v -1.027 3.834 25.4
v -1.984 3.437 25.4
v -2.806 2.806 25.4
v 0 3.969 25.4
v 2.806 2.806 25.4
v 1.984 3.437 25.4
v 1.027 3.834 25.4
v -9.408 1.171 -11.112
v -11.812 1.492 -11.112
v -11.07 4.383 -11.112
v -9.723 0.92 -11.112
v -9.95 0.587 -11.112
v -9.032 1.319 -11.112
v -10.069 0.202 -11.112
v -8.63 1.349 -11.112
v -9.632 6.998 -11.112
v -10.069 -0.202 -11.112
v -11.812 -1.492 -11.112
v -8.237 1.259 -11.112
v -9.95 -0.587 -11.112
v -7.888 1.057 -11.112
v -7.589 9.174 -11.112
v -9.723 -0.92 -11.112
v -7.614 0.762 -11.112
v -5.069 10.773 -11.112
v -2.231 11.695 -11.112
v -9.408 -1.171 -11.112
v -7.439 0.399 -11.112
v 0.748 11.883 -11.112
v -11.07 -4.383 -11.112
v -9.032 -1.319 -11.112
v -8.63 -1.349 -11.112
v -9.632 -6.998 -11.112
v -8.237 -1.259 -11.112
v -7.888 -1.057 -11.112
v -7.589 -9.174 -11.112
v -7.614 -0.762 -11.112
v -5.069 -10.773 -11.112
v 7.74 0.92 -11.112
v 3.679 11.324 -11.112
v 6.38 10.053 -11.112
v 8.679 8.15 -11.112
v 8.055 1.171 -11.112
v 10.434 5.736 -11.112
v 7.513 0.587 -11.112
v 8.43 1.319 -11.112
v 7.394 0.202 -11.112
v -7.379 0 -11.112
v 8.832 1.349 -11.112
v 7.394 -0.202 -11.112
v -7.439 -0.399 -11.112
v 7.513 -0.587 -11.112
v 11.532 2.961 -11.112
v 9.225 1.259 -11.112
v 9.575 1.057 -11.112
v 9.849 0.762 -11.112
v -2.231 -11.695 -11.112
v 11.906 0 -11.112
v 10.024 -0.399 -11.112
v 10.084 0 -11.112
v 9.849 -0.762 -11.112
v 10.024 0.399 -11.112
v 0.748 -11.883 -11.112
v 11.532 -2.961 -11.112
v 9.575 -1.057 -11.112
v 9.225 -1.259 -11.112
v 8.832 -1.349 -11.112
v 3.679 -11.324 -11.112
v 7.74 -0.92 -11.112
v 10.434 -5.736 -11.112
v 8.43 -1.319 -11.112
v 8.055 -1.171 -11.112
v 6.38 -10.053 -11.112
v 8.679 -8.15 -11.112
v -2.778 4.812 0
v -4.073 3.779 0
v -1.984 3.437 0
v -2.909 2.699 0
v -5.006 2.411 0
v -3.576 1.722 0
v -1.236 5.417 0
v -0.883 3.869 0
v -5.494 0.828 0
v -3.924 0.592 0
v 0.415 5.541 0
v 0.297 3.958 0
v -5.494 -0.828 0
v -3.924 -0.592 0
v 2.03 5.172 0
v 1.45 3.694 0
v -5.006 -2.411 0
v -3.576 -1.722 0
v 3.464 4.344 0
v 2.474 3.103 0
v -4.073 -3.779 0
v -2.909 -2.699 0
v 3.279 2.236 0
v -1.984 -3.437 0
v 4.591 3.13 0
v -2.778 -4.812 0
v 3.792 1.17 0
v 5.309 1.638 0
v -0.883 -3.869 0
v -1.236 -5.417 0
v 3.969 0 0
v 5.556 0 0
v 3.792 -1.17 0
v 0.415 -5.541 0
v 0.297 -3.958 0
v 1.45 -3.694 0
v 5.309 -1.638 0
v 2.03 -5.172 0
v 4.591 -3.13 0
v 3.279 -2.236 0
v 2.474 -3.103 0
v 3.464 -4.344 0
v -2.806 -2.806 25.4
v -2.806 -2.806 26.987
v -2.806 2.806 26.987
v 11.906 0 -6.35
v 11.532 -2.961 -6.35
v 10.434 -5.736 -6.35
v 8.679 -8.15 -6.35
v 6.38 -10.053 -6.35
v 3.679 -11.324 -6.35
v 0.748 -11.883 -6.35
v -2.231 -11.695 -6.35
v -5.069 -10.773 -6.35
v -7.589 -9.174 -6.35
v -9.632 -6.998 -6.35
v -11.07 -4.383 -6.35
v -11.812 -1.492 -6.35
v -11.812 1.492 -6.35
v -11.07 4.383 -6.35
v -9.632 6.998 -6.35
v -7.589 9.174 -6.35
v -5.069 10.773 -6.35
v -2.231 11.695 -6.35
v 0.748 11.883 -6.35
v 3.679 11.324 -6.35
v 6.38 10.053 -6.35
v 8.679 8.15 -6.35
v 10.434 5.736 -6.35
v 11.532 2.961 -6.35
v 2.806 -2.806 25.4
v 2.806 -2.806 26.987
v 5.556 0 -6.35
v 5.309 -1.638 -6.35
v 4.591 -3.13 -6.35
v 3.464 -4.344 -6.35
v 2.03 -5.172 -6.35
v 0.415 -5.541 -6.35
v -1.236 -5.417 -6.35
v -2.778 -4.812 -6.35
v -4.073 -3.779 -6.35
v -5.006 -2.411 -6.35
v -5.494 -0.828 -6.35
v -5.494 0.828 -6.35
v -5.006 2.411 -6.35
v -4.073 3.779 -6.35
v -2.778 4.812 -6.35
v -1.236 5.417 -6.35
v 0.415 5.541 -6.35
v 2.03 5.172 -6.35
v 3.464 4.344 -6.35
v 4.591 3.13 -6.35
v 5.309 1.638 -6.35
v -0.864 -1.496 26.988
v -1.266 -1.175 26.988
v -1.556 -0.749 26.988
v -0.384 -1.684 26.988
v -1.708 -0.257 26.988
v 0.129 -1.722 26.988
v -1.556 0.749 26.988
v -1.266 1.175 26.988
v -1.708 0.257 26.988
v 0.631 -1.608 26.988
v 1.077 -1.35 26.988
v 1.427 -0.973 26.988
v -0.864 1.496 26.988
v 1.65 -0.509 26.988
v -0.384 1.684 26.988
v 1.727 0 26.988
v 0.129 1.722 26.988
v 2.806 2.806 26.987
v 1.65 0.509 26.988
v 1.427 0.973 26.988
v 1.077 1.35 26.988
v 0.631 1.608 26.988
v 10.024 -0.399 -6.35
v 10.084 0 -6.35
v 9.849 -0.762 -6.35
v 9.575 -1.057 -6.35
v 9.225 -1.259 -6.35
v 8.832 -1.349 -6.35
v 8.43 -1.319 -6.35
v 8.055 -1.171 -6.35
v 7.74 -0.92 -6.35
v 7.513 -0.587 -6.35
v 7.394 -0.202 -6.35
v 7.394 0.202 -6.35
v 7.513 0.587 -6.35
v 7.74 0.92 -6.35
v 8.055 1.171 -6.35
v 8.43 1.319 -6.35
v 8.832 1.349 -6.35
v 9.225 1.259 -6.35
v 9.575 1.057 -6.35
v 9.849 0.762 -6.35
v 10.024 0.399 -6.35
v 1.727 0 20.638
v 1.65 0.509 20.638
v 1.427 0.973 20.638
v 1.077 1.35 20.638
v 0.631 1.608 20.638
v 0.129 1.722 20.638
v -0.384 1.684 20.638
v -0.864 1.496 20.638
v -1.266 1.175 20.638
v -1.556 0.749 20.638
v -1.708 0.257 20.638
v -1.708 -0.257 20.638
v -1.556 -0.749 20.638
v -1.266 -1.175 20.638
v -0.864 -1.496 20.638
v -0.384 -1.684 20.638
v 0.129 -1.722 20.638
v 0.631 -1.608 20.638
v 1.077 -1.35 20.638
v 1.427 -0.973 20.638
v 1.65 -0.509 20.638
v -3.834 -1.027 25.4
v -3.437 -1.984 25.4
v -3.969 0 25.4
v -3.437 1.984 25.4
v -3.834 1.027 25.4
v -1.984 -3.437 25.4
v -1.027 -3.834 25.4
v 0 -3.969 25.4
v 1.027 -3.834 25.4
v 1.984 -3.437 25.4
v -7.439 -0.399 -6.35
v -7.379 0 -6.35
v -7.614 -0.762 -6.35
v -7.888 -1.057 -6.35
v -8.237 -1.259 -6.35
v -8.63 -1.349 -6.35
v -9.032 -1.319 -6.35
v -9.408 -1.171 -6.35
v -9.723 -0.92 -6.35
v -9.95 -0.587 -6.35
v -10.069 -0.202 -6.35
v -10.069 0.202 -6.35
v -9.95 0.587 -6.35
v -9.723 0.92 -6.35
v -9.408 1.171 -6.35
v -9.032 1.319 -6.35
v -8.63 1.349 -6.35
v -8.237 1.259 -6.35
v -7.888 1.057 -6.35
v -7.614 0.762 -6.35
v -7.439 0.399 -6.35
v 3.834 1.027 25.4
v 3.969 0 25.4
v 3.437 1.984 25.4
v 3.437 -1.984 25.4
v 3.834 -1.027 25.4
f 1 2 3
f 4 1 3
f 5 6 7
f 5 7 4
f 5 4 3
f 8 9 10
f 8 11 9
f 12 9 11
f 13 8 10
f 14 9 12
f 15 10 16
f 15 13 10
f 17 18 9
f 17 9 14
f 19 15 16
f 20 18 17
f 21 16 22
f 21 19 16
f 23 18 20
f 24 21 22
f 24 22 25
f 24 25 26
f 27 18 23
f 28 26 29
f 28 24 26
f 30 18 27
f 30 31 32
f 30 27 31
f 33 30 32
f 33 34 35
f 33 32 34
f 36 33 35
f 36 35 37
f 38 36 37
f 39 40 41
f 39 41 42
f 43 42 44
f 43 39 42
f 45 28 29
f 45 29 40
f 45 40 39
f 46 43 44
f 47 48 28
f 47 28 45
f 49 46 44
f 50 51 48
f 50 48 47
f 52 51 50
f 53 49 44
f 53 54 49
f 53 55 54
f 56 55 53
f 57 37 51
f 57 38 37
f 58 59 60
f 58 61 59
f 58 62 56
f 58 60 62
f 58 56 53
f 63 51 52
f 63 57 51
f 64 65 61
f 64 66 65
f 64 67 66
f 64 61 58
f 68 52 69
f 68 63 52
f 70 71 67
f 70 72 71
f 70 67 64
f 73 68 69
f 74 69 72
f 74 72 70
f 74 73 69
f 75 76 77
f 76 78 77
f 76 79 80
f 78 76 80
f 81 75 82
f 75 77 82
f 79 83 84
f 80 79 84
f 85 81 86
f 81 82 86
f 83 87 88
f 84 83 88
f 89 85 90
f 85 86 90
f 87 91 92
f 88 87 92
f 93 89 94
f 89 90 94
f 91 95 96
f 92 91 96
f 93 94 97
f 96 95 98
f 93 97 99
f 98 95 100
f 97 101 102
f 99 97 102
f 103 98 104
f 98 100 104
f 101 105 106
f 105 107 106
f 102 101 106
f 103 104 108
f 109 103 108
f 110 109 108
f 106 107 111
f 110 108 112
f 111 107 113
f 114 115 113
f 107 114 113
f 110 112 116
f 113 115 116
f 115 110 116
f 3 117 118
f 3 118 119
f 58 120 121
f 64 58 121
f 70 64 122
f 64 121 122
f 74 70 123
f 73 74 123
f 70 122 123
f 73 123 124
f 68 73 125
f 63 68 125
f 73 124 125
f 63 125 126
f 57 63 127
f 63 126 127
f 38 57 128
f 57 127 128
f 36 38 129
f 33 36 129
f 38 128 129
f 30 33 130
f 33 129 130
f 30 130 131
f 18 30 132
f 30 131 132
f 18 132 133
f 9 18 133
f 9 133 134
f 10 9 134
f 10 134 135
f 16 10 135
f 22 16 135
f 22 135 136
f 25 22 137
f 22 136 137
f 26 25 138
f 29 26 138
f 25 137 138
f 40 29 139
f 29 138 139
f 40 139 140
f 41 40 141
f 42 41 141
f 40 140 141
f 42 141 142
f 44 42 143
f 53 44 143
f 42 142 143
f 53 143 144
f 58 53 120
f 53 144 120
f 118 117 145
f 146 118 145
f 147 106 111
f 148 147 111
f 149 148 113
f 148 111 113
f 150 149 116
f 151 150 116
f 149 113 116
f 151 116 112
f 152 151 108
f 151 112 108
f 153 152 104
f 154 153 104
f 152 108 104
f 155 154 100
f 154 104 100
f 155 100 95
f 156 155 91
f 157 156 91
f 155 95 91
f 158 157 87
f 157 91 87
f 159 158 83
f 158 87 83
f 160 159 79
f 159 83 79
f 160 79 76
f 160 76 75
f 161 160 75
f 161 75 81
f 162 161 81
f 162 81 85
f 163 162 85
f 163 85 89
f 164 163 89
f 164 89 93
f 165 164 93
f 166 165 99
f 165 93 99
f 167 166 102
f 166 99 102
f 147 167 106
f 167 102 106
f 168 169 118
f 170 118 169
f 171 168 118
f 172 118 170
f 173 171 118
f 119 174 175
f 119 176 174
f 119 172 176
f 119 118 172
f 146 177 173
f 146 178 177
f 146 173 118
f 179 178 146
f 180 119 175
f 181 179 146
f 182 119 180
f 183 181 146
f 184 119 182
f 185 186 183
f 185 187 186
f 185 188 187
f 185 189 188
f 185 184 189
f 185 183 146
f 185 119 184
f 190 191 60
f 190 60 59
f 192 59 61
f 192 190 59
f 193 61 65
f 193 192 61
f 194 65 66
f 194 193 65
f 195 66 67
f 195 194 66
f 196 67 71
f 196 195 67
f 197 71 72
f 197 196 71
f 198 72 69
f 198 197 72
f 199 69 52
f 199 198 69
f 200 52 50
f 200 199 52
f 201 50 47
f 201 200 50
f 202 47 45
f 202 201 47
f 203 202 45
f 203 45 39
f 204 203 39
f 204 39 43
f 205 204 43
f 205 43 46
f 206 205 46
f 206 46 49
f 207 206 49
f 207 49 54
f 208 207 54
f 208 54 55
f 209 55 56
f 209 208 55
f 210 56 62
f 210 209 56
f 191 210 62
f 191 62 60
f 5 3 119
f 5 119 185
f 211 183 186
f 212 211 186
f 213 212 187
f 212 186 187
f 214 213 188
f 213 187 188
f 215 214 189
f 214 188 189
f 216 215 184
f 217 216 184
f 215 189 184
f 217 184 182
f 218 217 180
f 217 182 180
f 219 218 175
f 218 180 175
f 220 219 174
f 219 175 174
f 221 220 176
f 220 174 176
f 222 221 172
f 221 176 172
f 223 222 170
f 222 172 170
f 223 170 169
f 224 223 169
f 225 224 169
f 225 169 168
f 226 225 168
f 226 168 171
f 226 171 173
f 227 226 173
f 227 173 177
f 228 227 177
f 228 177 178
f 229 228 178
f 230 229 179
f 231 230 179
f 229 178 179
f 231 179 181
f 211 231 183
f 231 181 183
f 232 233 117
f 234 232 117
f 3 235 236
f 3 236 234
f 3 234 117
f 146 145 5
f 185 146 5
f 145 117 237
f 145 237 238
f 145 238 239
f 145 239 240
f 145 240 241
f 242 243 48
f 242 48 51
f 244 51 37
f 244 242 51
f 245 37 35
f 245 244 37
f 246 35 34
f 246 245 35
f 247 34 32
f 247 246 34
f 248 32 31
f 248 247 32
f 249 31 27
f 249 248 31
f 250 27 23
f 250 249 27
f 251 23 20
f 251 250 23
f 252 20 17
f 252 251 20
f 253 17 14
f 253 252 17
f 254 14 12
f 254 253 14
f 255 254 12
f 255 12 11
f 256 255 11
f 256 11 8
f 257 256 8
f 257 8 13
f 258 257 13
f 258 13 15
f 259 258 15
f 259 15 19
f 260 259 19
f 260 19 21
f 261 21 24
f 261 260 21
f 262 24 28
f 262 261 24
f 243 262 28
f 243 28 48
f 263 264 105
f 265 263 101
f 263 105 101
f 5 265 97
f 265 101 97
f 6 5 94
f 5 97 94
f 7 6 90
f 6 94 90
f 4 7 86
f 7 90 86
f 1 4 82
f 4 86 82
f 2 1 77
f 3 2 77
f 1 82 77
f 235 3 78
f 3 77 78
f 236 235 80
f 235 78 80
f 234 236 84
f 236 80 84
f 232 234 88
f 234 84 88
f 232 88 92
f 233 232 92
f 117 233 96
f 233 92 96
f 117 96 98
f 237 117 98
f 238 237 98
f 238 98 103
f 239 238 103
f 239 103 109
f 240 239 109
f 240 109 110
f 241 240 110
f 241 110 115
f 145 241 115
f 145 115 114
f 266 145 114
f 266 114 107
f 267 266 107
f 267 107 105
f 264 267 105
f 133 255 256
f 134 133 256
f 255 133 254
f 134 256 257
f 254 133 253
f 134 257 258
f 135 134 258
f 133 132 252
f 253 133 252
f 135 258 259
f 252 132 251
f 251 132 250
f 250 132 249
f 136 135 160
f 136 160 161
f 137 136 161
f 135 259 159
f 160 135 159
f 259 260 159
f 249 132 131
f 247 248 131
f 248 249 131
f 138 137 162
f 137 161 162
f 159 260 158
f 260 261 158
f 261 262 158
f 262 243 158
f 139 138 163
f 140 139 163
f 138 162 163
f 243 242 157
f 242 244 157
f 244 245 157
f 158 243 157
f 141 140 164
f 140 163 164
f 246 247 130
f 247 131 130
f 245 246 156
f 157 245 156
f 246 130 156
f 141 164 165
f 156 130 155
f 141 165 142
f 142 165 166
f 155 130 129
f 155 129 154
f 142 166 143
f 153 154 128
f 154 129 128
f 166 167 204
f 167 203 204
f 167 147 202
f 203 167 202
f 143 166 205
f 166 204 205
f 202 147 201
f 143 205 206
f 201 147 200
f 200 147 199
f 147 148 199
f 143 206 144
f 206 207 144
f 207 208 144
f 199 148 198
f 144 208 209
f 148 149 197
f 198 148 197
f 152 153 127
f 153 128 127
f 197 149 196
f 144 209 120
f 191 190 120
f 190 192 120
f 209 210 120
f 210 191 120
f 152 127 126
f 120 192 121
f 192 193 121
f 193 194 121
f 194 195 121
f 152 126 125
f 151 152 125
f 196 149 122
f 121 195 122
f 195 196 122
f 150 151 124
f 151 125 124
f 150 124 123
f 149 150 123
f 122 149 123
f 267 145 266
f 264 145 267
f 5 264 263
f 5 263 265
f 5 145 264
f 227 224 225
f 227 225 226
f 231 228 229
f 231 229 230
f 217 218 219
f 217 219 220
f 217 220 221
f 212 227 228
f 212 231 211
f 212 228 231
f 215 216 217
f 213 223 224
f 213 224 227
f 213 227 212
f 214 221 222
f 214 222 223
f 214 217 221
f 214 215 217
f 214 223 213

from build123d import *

# Parameters (mm, degrees)
F0_R     = 3.96875
F1_DEPTH = 25.4
F2_W     = 5.61266
F2_H     = 5.61266
F3_DEPTH = 1.5875
F4_R     = 1.7272
F5_DEPTH = 6.35
F6_R     = 5.55625
F7_DEPTH = 6.35
F8_R     = 11.90625
F8_R_2   = 1.35255
F9_DEPTH = 4.7625


with BuildPart() as f1:
    # F0 (on Top) → F1 (new body)
    with BuildSketch(Plane.XY):
        Circle(F0_R)
    extrude(amount=F1_DEPTH)

    # F2 (on face) → F3 (join)
    with BuildSketch(Plane.XY.offset(25.4)):
        Rectangle(F2_W, F2_H)
    extrude(amount=F3_DEPTH)

    # F4 (on face) → F5 (cut)
    with BuildSketch(Plane.XY.offset(26.9875)):
        Circle(F4_R)
    extrude(amount=-F5_DEPTH, mode=Mode.SUBTRACT)

    # F6 (on face) → F7 (join)
    with BuildSketch(Plane(origin=(0, 0, 0), x_dir=(1, 0, 0), z_dir=(0, 0, -1))):
        Circle(F6_R)
    extrude(amount=F7_DEPTH)

    # F8 (on face) → F9 (join)
    with BuildSketch(Plane(origin=(0, 0, -6.35), x_dir=(1, 0, 0), z_dir=(0, 0, -1))):
        Circle(F8_R)
        with Locations((-8.73125, 0)):
            Circle(F8_R_2, mode=Mode.SUBTRACT)
        with Locations((8.73125, 0)):
            Circle(F8_R_2, mode=Mode.SUBTRACT)
    extrude(amount=F9_DEPTH)


solid = f1.part
